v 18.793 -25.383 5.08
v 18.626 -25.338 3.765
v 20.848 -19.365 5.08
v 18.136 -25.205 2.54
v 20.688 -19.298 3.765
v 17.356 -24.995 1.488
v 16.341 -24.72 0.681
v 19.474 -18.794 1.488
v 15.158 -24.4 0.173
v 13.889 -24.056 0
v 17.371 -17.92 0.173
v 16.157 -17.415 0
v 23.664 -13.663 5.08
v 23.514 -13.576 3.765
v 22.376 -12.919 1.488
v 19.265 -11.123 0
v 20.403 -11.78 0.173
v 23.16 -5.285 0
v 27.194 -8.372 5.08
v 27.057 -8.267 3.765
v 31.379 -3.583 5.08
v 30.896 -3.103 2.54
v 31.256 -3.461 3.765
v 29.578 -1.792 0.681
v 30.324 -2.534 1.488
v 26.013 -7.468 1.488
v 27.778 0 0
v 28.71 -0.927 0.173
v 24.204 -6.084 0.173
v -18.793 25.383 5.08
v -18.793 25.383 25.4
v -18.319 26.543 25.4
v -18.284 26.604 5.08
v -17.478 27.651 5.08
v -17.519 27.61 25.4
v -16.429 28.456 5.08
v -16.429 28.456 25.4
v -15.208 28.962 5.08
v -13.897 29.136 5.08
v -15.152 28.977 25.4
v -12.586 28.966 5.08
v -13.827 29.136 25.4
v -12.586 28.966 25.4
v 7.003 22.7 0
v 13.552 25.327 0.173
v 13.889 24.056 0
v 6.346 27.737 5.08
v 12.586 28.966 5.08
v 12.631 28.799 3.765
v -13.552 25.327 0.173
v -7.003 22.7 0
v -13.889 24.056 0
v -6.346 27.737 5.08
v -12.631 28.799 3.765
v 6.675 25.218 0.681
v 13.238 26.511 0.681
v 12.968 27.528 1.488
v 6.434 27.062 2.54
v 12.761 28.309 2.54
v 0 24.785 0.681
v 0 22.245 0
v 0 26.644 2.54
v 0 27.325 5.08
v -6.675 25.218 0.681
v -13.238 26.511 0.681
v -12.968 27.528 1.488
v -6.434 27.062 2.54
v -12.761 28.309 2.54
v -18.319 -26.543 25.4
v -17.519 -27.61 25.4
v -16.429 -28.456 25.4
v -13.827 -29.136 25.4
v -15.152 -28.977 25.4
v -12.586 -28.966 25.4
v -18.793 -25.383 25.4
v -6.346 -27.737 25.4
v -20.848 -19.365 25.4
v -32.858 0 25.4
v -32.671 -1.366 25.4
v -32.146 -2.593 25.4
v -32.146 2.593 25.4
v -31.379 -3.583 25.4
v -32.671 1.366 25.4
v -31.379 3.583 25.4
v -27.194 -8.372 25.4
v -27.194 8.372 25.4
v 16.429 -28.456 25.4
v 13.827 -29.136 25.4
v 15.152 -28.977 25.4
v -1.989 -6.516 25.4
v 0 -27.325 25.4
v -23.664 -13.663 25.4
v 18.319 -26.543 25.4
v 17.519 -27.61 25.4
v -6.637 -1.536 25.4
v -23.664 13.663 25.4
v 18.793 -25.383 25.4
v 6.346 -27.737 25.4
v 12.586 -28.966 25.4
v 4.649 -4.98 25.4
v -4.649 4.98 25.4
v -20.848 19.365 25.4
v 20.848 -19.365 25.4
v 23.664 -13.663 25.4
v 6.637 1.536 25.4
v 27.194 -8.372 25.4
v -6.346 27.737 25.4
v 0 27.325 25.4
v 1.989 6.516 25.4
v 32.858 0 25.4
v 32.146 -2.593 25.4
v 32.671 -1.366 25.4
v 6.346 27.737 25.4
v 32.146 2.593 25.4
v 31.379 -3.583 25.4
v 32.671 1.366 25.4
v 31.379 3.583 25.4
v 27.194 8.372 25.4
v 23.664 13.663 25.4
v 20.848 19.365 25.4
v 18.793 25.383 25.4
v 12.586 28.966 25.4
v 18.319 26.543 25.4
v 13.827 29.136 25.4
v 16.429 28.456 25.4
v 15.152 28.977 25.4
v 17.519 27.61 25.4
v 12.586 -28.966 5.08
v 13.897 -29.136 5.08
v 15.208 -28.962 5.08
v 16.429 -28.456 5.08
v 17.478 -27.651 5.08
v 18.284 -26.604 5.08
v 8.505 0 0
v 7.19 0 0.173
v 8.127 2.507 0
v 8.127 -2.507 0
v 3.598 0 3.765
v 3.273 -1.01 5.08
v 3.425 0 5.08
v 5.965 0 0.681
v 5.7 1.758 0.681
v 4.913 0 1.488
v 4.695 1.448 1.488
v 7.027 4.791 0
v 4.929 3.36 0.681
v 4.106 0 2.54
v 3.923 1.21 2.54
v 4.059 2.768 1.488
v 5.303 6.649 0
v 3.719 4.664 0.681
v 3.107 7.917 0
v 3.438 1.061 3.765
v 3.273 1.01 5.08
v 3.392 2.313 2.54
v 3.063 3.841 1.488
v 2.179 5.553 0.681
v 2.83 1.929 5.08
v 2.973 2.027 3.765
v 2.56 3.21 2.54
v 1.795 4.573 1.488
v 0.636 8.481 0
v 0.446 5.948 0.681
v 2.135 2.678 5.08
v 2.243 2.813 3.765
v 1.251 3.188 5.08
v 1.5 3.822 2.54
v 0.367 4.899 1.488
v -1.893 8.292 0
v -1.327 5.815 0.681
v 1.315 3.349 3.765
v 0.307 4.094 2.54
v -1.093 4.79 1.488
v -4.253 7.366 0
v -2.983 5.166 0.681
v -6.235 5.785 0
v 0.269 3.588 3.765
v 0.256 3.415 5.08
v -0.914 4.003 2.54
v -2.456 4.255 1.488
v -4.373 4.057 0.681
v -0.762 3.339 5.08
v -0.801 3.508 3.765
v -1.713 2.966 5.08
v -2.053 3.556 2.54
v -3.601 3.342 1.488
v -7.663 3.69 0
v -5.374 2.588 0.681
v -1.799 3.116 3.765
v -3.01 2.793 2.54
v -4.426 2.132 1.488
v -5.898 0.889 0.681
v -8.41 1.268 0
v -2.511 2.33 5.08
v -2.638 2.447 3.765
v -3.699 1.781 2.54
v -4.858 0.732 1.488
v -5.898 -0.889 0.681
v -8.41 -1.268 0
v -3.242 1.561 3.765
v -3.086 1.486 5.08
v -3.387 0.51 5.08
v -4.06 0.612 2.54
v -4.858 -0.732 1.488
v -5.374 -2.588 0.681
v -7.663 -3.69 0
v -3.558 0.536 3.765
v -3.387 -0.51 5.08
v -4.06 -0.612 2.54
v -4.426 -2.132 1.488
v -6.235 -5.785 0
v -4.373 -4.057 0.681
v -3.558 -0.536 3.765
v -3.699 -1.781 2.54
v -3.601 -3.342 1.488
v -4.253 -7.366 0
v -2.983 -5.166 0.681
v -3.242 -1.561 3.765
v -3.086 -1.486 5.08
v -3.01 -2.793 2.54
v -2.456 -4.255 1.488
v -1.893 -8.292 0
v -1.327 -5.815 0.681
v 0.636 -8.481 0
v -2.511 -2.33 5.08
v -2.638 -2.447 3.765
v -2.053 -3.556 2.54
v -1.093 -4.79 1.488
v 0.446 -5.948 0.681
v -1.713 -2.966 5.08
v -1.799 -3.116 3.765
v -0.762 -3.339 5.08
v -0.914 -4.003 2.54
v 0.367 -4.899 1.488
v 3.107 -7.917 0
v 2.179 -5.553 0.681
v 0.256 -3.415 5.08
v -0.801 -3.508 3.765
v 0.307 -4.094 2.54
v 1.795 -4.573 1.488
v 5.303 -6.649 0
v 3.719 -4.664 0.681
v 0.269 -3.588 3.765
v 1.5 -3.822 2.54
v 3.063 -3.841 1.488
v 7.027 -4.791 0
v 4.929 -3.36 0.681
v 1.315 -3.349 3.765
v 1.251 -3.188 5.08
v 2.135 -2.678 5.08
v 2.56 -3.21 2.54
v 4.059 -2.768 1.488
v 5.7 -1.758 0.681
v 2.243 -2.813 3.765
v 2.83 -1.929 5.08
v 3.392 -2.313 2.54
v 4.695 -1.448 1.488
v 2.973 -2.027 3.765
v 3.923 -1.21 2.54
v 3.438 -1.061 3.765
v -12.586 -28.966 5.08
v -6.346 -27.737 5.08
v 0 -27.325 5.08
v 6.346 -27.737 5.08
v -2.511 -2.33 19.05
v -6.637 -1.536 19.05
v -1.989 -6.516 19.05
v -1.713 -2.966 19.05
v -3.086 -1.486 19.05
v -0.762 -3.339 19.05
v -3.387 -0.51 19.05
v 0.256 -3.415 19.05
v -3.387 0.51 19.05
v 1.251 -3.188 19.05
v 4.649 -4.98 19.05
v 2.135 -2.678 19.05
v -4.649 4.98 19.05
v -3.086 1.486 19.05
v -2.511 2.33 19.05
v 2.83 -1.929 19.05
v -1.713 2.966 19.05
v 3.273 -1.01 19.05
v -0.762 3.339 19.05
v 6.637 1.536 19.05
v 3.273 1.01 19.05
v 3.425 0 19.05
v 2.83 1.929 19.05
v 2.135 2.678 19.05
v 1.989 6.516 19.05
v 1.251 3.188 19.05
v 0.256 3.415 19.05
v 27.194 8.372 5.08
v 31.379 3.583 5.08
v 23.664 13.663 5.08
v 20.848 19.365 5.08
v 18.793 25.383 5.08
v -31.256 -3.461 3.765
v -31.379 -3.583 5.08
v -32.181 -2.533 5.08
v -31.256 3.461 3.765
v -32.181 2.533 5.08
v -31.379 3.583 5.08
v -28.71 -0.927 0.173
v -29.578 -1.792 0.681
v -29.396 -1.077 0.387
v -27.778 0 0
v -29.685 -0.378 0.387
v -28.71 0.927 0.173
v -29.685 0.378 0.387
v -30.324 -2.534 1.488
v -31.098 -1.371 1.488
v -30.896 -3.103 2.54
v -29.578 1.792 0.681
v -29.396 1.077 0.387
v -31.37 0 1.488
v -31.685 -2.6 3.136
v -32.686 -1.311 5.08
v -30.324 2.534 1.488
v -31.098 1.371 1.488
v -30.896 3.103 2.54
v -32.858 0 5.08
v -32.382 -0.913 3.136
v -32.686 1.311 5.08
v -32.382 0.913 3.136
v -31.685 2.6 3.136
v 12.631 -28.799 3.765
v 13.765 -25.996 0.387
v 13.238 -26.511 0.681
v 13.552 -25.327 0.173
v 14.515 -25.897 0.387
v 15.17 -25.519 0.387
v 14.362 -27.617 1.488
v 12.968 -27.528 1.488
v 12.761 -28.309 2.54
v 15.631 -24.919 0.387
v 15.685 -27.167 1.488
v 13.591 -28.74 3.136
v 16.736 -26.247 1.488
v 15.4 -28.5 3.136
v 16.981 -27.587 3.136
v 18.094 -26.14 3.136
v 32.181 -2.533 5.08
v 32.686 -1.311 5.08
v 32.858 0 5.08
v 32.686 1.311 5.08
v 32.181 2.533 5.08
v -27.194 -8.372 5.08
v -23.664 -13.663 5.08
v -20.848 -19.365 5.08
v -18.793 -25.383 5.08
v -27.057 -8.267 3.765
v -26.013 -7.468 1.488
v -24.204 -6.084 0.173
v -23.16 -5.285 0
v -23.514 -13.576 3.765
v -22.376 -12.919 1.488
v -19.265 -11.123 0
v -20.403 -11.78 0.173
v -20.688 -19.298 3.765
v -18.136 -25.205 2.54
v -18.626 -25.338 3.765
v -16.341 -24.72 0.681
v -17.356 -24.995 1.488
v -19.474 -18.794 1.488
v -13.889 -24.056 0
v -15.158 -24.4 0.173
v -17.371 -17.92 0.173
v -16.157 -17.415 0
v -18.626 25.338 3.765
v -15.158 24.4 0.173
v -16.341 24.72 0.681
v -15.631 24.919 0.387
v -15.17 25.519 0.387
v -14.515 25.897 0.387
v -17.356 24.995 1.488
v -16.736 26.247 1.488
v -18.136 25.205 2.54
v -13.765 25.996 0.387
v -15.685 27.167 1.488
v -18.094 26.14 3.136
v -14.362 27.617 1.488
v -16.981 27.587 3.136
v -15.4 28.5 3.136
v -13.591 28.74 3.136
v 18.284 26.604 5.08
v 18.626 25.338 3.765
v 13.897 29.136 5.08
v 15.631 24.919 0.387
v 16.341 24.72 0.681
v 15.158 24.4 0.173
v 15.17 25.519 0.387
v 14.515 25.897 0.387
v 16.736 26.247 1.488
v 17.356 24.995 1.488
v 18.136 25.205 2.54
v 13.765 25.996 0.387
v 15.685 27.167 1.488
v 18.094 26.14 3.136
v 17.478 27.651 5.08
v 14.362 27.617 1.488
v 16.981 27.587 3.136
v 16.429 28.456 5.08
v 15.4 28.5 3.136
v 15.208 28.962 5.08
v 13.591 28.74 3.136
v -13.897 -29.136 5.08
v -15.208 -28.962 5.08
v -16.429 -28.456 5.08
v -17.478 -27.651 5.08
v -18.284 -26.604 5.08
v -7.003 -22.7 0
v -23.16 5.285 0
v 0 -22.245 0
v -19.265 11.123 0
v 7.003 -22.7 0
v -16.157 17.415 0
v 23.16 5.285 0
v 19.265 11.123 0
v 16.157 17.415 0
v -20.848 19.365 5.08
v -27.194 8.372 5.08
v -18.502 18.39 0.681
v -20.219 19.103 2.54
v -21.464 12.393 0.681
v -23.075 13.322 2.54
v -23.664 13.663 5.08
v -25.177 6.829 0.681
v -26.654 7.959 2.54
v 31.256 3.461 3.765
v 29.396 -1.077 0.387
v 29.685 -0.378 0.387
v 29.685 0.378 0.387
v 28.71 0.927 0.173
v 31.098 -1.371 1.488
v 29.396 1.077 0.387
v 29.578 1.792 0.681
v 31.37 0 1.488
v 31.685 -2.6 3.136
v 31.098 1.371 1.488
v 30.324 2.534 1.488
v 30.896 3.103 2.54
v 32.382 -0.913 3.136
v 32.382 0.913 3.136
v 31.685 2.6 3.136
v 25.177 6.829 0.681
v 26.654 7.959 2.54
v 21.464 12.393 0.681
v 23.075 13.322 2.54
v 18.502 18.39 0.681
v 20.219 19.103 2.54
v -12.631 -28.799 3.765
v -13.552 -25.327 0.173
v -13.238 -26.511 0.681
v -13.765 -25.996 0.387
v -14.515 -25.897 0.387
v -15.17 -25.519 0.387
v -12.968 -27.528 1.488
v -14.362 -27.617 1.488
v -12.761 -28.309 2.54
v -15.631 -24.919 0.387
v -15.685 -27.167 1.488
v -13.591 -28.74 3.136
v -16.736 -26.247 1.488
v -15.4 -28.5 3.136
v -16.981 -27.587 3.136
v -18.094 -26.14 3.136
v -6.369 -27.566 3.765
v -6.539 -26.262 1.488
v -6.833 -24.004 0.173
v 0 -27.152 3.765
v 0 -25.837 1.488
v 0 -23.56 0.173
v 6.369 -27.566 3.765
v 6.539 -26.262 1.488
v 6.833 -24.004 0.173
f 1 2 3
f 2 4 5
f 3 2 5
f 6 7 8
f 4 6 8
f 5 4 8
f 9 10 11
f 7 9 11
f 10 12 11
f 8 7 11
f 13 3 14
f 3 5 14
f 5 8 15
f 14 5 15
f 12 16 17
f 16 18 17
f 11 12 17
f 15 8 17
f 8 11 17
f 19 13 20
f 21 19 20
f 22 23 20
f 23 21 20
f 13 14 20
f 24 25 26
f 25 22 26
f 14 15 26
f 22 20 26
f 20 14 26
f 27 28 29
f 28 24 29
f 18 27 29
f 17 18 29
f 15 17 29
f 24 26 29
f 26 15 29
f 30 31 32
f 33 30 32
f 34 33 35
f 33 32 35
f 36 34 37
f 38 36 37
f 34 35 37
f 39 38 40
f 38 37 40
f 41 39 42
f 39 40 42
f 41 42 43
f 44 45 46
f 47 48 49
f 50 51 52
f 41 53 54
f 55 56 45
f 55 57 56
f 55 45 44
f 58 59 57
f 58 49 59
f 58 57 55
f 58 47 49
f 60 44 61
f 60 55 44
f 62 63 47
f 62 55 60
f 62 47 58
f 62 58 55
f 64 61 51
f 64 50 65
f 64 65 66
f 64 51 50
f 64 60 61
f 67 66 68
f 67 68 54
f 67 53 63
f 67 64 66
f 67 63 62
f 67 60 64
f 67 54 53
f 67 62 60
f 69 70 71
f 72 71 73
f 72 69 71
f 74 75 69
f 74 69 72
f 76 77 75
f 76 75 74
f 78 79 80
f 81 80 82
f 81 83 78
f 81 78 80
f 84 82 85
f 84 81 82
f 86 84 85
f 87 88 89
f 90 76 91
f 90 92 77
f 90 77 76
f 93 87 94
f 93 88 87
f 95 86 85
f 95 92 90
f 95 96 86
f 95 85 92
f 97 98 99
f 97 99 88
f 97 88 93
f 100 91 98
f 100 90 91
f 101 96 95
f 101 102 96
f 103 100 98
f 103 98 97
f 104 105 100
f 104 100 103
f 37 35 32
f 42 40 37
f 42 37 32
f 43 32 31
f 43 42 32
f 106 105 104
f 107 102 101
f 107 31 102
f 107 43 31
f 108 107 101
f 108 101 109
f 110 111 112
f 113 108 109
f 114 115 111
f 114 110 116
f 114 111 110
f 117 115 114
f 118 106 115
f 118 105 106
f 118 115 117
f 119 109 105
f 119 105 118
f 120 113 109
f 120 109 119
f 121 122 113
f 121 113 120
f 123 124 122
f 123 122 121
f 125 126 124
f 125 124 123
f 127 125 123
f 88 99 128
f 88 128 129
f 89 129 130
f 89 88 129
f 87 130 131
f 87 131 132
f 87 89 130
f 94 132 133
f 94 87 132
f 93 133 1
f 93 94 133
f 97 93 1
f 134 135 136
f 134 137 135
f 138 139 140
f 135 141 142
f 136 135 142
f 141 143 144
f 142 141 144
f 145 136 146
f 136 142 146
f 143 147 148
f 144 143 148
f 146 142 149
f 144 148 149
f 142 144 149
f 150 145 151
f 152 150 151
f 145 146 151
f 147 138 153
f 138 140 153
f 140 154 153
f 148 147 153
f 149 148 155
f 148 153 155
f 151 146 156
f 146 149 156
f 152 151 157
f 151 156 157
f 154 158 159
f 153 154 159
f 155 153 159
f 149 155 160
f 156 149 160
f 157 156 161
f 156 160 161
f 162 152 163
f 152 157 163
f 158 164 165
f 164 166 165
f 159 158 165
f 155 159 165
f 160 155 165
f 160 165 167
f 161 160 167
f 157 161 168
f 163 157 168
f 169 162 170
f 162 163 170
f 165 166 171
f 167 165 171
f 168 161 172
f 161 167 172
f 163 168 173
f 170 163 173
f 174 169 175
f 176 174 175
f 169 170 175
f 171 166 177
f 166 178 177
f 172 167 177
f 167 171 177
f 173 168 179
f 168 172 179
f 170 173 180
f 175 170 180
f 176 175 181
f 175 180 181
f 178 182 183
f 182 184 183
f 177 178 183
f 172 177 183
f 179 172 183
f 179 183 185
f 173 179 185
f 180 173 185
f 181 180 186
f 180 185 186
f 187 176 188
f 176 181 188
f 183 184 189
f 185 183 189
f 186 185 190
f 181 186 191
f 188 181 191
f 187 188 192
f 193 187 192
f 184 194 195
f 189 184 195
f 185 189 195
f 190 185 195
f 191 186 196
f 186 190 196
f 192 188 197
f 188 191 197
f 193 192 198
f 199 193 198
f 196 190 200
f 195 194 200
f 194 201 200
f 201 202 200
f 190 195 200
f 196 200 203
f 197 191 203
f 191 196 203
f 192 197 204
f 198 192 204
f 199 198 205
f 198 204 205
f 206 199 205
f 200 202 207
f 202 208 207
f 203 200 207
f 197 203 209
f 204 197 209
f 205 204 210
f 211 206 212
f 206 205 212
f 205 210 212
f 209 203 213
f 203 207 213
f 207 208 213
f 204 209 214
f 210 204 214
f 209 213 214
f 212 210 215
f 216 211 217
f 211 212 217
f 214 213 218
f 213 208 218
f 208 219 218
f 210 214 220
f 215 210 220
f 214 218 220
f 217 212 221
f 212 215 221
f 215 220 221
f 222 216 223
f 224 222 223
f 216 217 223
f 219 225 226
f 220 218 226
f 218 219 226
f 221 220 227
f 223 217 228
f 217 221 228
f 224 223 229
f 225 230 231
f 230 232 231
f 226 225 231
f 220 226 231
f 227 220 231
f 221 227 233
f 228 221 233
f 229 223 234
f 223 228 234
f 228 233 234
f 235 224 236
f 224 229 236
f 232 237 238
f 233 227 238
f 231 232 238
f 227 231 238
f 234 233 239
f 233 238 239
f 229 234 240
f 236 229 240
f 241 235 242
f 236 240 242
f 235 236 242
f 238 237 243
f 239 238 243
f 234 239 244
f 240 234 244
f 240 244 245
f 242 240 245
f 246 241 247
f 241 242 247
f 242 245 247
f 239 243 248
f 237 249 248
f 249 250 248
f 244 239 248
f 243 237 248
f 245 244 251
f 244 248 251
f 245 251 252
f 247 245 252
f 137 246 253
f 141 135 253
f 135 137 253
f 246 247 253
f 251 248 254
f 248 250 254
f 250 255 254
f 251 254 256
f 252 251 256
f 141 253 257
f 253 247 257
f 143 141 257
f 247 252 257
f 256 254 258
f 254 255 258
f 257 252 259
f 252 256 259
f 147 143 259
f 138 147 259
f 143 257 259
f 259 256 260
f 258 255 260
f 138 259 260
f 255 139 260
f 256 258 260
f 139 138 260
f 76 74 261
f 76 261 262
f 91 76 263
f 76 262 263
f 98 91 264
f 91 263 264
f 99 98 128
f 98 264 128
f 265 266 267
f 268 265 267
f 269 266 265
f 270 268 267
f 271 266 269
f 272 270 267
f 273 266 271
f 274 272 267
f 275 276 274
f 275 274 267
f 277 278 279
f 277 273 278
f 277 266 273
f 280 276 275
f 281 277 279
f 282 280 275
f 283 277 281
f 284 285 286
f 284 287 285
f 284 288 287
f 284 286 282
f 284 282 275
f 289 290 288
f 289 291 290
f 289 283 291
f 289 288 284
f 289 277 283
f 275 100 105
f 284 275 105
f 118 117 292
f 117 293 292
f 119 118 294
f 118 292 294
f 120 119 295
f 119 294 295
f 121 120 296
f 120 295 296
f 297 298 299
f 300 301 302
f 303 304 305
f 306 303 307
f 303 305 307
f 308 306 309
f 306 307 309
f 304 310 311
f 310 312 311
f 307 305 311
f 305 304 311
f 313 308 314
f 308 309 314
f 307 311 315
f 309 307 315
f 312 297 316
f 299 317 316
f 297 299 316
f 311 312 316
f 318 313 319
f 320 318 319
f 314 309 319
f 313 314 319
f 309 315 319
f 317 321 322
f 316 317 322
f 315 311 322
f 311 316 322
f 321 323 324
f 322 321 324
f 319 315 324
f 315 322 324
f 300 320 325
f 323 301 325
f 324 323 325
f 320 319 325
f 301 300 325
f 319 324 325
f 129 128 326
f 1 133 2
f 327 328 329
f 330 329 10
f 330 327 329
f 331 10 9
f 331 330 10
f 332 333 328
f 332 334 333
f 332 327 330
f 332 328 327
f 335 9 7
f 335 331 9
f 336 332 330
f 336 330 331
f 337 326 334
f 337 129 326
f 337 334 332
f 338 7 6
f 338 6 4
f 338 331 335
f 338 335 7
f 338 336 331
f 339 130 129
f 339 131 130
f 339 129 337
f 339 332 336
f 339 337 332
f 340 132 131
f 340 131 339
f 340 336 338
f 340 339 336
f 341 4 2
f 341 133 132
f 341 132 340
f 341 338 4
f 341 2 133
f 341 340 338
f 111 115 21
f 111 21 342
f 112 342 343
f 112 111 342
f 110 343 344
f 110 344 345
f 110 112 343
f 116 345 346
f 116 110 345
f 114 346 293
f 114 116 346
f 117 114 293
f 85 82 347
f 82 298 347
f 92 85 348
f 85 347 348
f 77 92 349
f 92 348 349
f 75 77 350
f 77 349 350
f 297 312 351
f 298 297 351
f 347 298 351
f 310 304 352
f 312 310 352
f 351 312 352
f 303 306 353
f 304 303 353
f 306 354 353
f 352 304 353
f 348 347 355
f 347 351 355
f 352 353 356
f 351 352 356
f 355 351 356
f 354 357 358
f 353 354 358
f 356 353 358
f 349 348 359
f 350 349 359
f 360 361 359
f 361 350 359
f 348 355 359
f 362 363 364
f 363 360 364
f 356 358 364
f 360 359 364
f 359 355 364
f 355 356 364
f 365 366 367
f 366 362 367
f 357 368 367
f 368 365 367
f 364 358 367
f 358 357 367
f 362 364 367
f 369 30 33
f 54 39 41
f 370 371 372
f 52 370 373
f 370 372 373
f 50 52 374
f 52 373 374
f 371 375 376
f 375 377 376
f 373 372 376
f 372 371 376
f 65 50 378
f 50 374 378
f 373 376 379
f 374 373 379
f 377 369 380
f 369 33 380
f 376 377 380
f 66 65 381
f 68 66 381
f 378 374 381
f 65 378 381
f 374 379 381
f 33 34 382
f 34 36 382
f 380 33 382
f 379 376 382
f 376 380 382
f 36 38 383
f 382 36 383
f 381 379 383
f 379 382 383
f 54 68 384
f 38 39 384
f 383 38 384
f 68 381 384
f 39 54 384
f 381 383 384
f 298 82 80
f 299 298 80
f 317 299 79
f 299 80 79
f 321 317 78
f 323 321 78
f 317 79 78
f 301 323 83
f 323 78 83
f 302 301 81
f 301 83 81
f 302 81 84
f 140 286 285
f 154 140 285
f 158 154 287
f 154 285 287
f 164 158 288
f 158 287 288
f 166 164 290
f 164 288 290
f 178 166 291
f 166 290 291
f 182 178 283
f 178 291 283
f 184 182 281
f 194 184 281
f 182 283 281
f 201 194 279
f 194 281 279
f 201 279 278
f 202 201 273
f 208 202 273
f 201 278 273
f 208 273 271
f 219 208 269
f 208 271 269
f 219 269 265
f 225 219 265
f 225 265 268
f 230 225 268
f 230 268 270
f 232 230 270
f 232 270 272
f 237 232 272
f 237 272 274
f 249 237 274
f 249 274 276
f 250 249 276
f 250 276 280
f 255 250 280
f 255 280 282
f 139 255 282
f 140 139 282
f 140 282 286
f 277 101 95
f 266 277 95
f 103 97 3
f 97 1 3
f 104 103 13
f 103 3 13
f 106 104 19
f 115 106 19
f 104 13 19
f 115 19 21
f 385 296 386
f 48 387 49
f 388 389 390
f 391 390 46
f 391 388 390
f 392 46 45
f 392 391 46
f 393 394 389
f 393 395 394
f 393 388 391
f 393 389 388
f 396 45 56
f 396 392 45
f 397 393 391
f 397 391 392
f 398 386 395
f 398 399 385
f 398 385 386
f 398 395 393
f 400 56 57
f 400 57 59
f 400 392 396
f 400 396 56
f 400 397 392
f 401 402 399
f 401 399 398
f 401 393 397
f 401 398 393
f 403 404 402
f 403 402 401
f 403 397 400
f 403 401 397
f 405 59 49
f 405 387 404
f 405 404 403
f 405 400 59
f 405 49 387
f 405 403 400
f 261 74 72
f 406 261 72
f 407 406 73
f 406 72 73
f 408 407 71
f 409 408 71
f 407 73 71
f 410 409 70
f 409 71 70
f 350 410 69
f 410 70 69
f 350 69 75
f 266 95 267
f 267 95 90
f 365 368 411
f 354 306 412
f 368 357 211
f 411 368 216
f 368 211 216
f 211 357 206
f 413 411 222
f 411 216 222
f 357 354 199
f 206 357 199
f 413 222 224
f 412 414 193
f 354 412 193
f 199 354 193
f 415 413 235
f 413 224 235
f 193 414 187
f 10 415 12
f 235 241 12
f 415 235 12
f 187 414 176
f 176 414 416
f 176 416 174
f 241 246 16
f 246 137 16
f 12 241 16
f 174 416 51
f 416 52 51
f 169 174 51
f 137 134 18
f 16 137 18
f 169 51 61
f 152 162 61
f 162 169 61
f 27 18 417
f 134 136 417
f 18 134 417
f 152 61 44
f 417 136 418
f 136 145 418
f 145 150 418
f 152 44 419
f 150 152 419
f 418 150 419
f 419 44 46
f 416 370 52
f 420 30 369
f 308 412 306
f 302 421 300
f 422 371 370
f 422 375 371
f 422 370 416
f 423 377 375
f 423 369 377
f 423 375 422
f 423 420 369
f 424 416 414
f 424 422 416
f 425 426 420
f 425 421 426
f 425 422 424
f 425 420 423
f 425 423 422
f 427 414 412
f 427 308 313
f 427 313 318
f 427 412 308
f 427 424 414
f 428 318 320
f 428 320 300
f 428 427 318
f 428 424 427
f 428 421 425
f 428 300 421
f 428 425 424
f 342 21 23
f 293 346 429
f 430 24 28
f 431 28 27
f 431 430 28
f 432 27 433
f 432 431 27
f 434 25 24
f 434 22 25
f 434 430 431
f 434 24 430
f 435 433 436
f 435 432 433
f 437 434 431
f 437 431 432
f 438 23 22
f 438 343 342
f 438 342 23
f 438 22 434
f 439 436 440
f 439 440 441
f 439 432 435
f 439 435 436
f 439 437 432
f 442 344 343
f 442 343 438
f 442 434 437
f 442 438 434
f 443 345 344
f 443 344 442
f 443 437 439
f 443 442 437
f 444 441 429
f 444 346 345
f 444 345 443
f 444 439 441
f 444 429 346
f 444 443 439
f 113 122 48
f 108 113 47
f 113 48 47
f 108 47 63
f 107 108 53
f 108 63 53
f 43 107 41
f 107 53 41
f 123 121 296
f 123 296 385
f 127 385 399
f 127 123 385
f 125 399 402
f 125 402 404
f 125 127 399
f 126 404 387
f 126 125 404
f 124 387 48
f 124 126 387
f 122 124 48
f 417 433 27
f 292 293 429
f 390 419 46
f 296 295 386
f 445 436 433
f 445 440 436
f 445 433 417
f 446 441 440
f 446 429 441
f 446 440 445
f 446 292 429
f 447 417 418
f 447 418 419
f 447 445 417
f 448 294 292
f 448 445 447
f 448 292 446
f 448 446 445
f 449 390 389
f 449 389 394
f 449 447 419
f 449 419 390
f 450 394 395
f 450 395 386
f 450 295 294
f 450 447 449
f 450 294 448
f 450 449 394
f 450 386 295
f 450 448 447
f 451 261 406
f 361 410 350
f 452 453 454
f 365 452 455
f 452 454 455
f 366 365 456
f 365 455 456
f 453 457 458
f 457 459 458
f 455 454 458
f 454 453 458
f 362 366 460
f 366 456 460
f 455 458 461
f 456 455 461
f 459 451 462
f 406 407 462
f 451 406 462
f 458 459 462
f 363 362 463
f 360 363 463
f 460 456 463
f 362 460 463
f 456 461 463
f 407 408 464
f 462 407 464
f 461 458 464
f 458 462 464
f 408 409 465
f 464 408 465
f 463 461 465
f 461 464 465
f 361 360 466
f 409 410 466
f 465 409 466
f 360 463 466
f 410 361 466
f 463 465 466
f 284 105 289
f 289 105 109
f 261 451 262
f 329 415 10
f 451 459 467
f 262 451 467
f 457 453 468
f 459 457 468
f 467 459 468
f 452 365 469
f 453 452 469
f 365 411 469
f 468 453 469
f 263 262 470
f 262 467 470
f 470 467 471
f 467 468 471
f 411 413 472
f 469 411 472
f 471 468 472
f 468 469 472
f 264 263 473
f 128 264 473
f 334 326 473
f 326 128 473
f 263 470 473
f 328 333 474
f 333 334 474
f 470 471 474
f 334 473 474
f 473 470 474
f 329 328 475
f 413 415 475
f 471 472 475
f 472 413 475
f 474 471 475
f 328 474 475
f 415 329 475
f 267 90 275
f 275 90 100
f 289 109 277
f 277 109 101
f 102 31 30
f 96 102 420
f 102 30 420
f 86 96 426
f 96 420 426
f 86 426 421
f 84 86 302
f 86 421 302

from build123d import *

# Parameters (mm, degrees)
F1_DEPTH = 25.4
F2_R     = 3.425
F3_DEPTH = 25.4
F4_R     = 5.08
F6_DEPTH = 6.35


with BuildPart() as f1:
    # F0 (on Top) → F1 (new body)
    with BuildSketch(Plane.XY):
        with BuildLine():
            ThreePointArc((-17.6783595035, -30.6198168546), (0, -27.3250688074), (17.6783595035, -30.6198168546))
            ThreePointArc((17.6783595035, -30.6198168546), (23.6642037473, -13.6625344037), (35.3567190071, 0))
            ThreePointArc((35.3567190071, 0), (23.6642037473, 13.6625344037), (17.6783595035, 30.6198168546))
            ThreePointArc((17.6783595035, 30.6198168546), (0, 27.3250688074), (-17.6783595035, 30.6198168546))
            ThreePointArc((-17.6783595035, 30.6198168546), (-23.6642037473, 13.6625344037), (-35.3567190071, 0))
            ThreePointArc((-35.3567190071, 0), (-23.6642037473, -13.6625344037), (-17.6783595035, -30.6198168546))
        make_face()
    extrude(amount=F1_DEPTH)

    # F2 (on face) → F3 (cut)
    with BuildSketch(Plane.XY.offset(25.4)):
        Circle(F2_R)
    extrude(amount=-F3_DEPTH, mode=Mode.SUBTRACT)

    # F4
    f4_edges = [f1.edges().sort_by_distance(p)[0] for p in [
        (-35.356719, 0, 12.7),
        (-17.67836, -30.619817, 12.7),
        (17.67836, -30.619817, 12.7),
        (35.356719, 0, 12.7),
        (17.67836, 30.619817, 12.7),
        (-17.67836, 30.619817, 12.7),
        (0, -27.325069, 0),
        (-23.664204, -13.662534, 0),
        (23.664204, -13.662534, 0),
        (-23.664204, 13.662534, 0),
        (23.664204, 13.662534, 0),
        (0, 27.325069, 0),
        (-3.425, 0, 0),
    ]]
    fillet(f4_edges, radius=F4_R)

    # F5 (on face) → F6 (cut)
    with BuildSketch(Plane.XY.offset(25.4)):
        Polygon((-1.9887100499, -6.5160084155), (4.6486737941, -4.9802776317), (6.637383844, 1.5357307838), (1.9887100499, 6.5160084155), (-4.6486737941, 4.9802776317), (-6.637383844, -1.5357307838), align=None)
    extrude(amount=-F6_DEPTH, mode=Mode.SUBTRACT)


solid = f1.part
